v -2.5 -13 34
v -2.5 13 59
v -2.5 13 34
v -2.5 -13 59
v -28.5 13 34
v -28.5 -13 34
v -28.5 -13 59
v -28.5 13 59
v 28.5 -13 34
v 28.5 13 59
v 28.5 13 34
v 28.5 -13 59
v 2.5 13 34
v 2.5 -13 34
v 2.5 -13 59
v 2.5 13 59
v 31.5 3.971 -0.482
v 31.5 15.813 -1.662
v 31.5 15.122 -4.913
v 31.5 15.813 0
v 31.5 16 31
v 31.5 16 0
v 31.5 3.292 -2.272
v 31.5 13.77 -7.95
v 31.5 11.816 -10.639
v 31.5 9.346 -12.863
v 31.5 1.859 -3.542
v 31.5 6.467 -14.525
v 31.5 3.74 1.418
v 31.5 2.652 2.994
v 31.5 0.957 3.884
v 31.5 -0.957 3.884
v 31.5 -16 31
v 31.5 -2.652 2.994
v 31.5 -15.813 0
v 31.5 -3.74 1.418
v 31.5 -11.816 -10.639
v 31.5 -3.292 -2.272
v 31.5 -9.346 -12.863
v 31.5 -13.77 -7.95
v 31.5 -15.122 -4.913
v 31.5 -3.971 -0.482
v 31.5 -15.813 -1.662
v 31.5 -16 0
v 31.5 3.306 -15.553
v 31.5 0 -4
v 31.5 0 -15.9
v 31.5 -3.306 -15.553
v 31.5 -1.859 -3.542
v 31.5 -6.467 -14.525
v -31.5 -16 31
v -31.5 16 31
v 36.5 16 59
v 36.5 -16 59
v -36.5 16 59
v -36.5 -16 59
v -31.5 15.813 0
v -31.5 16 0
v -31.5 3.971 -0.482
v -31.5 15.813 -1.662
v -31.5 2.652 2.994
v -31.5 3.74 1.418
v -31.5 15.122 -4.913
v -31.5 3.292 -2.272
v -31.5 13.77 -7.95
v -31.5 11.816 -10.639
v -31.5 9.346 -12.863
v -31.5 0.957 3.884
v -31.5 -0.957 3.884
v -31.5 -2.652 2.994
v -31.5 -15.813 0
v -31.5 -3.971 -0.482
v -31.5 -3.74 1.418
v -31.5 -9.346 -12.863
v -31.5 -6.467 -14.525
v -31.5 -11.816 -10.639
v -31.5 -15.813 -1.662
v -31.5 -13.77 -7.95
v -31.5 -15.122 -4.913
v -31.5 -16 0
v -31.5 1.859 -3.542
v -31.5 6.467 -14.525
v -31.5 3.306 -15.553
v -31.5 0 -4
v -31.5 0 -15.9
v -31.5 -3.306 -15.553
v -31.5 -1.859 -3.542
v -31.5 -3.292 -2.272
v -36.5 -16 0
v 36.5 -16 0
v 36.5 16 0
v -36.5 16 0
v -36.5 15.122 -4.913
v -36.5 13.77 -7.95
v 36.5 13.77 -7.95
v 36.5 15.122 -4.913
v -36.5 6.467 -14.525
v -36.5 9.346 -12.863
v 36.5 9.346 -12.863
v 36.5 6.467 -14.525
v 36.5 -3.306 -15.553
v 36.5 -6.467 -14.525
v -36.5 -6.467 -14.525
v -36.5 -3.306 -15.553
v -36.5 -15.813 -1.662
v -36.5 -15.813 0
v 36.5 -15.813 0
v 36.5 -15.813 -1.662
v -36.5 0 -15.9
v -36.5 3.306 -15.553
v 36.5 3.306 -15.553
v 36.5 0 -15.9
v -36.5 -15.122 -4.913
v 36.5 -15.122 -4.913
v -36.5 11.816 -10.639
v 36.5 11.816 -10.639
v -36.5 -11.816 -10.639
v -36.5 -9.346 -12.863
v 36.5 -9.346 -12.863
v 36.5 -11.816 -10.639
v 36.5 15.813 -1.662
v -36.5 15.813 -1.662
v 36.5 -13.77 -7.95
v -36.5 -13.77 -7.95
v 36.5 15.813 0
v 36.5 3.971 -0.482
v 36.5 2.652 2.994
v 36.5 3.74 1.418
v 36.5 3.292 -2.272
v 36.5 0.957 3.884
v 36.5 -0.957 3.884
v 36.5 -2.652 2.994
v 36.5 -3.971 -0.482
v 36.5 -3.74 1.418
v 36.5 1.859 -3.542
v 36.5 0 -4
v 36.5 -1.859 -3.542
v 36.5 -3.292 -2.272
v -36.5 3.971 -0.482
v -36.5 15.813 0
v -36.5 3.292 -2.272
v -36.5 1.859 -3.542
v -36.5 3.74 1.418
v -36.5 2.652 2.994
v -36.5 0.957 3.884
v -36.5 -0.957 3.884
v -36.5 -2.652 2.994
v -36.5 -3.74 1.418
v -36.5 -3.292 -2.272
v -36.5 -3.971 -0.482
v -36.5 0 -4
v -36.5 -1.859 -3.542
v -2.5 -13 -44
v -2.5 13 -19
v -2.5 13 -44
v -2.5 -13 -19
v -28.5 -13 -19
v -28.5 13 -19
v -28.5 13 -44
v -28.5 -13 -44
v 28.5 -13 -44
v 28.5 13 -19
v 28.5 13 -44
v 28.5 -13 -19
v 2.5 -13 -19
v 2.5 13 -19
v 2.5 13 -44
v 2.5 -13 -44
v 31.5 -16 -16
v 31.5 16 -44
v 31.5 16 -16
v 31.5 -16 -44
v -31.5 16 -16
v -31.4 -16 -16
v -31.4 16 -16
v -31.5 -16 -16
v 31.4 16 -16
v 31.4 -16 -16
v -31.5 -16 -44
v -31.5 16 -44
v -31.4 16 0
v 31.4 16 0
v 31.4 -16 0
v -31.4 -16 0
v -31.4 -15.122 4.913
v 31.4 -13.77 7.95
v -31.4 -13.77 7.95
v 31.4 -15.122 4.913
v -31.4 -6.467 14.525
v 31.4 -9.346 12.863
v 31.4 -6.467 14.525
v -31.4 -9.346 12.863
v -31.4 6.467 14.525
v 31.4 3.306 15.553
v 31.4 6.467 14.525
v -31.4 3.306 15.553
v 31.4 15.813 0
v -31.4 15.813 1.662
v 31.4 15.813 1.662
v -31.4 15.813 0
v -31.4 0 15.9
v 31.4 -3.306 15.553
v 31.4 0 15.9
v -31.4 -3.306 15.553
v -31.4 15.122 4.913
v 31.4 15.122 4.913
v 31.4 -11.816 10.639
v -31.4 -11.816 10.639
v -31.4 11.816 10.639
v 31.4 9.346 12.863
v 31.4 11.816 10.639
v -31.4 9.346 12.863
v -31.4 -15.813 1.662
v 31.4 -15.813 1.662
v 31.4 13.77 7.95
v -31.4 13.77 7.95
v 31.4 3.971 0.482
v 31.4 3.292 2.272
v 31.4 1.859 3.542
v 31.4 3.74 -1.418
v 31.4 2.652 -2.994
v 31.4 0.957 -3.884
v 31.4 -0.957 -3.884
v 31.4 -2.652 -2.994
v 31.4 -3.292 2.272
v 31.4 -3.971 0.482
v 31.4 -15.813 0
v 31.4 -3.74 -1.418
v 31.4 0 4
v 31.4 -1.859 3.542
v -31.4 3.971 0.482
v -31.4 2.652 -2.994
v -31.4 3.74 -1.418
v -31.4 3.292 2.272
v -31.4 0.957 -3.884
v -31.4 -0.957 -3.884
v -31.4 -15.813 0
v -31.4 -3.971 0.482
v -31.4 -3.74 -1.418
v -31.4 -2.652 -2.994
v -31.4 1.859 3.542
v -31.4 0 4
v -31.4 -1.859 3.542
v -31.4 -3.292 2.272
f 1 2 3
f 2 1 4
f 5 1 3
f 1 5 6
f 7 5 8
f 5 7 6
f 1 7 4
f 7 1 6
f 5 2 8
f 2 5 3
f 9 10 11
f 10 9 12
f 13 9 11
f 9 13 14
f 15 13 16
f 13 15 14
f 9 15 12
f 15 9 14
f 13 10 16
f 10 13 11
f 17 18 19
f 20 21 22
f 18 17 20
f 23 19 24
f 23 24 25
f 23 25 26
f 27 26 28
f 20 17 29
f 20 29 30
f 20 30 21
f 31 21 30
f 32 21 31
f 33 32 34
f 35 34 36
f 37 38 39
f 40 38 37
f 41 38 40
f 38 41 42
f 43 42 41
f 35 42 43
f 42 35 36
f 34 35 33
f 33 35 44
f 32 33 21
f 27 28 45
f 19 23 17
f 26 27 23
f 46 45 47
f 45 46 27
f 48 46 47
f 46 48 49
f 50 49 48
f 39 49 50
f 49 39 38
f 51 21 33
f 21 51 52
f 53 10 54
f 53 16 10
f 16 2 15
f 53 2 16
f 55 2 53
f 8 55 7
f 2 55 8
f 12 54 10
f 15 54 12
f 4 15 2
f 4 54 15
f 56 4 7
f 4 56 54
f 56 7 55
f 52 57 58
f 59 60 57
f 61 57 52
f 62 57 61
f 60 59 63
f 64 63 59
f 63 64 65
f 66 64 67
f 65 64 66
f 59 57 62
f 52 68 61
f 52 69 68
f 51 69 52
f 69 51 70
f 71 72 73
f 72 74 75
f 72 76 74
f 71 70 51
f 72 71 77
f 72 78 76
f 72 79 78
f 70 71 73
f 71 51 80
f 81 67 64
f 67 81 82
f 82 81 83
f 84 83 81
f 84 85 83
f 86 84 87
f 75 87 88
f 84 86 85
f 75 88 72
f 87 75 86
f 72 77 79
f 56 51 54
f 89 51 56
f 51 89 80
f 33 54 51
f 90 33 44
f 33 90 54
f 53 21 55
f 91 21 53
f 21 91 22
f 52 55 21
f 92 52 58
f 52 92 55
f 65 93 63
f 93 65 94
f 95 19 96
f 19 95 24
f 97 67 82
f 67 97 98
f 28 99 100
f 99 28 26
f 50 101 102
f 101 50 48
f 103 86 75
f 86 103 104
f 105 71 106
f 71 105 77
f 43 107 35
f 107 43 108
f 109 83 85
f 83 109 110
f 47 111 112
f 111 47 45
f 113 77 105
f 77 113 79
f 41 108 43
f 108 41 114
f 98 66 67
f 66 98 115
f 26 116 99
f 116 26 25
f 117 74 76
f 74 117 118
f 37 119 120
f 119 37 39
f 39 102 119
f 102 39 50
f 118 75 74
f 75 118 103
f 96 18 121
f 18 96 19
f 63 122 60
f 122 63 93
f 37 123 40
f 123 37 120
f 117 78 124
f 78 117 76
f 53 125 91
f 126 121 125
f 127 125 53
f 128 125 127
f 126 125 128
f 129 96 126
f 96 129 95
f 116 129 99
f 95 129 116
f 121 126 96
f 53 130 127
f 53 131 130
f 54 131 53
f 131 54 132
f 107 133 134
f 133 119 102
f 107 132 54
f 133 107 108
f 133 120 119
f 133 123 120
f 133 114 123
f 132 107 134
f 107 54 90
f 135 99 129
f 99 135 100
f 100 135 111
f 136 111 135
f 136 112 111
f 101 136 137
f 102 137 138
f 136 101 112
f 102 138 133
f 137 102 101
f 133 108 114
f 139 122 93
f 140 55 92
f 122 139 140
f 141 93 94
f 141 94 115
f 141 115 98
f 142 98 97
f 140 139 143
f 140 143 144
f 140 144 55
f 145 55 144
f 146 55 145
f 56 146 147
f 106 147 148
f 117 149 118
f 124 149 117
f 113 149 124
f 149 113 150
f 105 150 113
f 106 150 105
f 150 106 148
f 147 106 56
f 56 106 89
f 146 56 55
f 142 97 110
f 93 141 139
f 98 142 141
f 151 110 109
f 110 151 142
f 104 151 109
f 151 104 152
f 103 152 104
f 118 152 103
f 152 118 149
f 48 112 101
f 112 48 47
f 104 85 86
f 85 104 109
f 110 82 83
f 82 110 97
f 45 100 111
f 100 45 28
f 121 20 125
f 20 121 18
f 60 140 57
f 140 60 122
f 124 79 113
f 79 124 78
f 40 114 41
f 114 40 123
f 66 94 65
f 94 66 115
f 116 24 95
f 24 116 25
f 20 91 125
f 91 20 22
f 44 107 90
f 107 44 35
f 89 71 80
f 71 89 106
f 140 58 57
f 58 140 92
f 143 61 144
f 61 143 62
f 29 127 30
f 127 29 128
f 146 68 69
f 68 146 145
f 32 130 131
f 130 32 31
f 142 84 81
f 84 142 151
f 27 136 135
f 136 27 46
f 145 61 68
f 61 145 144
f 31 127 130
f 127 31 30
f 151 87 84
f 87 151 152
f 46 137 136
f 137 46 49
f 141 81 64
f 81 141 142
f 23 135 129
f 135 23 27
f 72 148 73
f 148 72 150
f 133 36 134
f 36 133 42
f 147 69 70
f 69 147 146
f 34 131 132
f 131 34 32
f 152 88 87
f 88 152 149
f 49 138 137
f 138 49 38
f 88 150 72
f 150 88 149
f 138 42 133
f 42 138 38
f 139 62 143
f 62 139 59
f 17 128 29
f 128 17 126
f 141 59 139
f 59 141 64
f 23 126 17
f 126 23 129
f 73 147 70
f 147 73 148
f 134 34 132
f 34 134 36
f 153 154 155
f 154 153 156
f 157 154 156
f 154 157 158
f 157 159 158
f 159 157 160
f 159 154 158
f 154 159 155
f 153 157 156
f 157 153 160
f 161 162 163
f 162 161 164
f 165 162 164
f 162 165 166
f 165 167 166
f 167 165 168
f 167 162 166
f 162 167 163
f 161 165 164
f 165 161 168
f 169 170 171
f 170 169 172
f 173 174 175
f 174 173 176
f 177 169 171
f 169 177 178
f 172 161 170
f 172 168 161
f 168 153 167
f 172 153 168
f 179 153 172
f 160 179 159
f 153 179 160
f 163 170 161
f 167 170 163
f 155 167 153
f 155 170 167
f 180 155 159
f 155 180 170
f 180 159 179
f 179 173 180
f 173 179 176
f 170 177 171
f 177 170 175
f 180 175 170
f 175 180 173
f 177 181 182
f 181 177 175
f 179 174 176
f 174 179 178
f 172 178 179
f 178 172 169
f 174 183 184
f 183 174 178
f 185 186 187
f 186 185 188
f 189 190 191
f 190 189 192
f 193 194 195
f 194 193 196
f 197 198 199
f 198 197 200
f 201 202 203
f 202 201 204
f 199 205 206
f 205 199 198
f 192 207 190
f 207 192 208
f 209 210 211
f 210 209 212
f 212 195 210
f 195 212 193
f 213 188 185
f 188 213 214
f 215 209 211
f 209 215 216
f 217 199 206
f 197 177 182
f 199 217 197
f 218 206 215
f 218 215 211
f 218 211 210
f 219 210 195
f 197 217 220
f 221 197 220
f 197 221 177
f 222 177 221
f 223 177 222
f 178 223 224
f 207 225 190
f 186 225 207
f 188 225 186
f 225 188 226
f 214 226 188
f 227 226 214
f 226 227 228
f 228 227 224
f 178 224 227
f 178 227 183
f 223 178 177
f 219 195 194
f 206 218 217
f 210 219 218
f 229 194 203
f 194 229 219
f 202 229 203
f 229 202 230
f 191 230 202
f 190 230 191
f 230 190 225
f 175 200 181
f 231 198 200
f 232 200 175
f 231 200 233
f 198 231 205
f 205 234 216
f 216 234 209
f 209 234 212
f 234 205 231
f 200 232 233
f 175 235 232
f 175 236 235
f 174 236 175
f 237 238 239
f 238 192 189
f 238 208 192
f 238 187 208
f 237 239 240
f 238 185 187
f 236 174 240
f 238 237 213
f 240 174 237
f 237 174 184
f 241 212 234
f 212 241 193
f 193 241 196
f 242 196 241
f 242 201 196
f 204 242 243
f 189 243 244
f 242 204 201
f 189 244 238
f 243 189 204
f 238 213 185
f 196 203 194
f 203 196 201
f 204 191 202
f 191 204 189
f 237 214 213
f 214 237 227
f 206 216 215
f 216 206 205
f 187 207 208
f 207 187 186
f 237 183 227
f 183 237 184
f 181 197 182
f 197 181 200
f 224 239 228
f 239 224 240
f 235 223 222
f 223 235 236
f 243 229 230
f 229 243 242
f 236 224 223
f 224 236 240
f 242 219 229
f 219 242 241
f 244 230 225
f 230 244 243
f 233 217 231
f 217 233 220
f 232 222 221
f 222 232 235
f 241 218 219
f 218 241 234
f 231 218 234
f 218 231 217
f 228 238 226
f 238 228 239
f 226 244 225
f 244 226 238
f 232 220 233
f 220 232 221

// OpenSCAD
//diameter of pin
pindia = 8;
//extrusion side
extrusionside = 26;
//distance between the two extrusions
extrusionsep = 5;
//Thickness of material around the extrusion
extrusionsurrond = 3;
//legnth of material going over the extrusion (covering the extrusion)
extrusioncover = 25;
// the width of the inside of the hinge
hingewidth = extrusionside*2 + extrusionsep+extrusionsurrond*2;
//the thickness of the end hinges
hingethickness = 5;
//thickness of material around pin
pinsurrond = (extrusionside+extrusionsurrond*2-pindia)/2;
//the offset of the hinge from the start of hinge joint
hingeoffset = 15;
// tolerance for the hinge radially
pinsurrondtol = .1;
//tolerance for the hinge axially
hingetol = .2;

module cap() {
    difference(){
        union(){
            translate([-(extrusionsep + extrusionside*2+extrusionsurrond*2)/2, -(extrusionside+extrusionsurrond*2)/2,0]){cube([extrusionsep + extrusionside*2+extrusionsurrond*2, extrusionside+extrusionsurrond*2,extrusioncover+extrusionsurrond]);}
        }
        
        union(){
            translate([-extrusionsep/2-extrusionside,-extrusionside/2,-1]){cube([extrusionside,extrusionside,extrusioncover + 1]);}
            translate([extrusionsep/2,-extrusionside/2,-1]){cube([extrusionside,extrusionside,extrusioncover + 1]);}
        }
    }
}

//cap();

module hingein(){
    difference(){
        union(){
            translate([-(hingewidth - hingetol)/2,0,0]){rotate(a = [0,90,0]){cylinder(r = (pindia+pinsurrond*2-pinsurrondtol*2)/2, h = hingewidth - hingetol);}}
            translate([-(hingewidth - hingetol)/2,-(pindia+pinsurrond*2)/2,0]){cube([hingewidth - hingetol,(pindia+pinsurrond*2),(pindia+pinsurrond*2)/2]);}
        }
        
        union(){
            translate([-(hingewidth - hingetol/2 + 1)/2,0,0]){rotate(a = [0,90,0]){cylinder(r = (pindia)/2, h = hingewidth - hingetol/2 + 1);}}
        }
    }
}

//hingein();

module hingeout(){
     difference(){
        union(){
            translate([-(extrusionsep + extrusionside*2+extrusionsurrond*2+hingethickness*2)/2,0,0]){rotate(a = [0,90,0]){cylinder(r = (pindia+pinsurrond*2-pinsurrondtol*2)/2, h = extrusionsep + extrusionside*2+extrusionsurrond*2 + hingethickness*2);}}
            translate([-(extrusionsep + extrusionside*2+extrusionsurrond*2+hingethickness*2)/2,-(pindia+pinsurrond*2)/2,0]){cube([extrusionsep + extrusionside*2+extrusionsurrond*2+hingethickness*2,(pindia+pinsurrond*2),(pindia+pinsurrond*2)/2 + hingeoffset+extrusioncover+extrusionsurrond]);}
        }
        
        union(){
            translate([-(extrusionsep + extrusionside*2+extrusionsurrond*2 +hingethickness * 2 + 1)/2,0,0]){rotate(a = [0,90,0]){cylinder(r = (pindia)/2, h = extrusionsep + extrusionside*2+extrusionsurrond*2 +hingethickness * 2 + 1);}}
            
            translate([-(hingewidth)/2,-(pindia+pinsurrond*2 + 1)/2,-(pindia+pinsurrond*2 + 1)/2]){cube([hingewidth,(pindia+pinsurrond*2 + 1),(pindia+pinsurrond*2 + hingeoffset+ extrusioncover+extrusionsurrond +1)]);}
        }
    }
}

module connection(){
    difference(){
        union(){
            translate([-(pinsurrond*2 + pinsurrondtol+ pindia)/2,0,0]){cylinder(r = (pindia + pinsurrond*2)/2, h = (extrusionsep + extrusionside*2+extrusionsurrond*2 - hingewidth )/ 2);}
            translate([(pinsurrond*2 + pinsurrondtol+ pindia)/2,0,0]){cylinder(r = (pindia + pinsurrond*2)/2, h = (extrusionsep + extrusionside*2+extrusionsurrond*2 - hingewidth )/ 2);}
            translate([-(pinsurrond*2 + pinsurrondtol+ pindia)/2,-(pindia + pinsurrond*2)/2,0]){cube([pinsurrond*2 + pinsurrondtol+ pindia,pindia + pinsurrond*2,(extrusionsep + extrusionside*2+extrusionsurrond*2 - hingewidth )/ 2]);}
        }
        
        union(){
            translate([-(pinsurrond*2 + pinsurrondtol+ pindia)/2,0,-.1]){cylinder(r = (pindia)/2, h = (extrusionsep + extrusionside*2+extrusionsurrond*2 - hingewidth )/ 2 + .2);}
            translate([(pinsurrond*2 + pinsurrondtol+ pindia)/2,0,-.1]){cylinder(r = (pindia)/2, h = (extrusionsep + extrusionside*2+extrusionsurrond*2 - hingewidth )/ 2 + .2);}
        }
    }
}

//rotate(a = [0,270,180]){translate([pinsurrond+pindia/2,0,0]){connection();}}

//hingeout();

//lower
union(){
    translate([0,0,(pindia+pinsurrond*2)/2+extrusioncover+extrusionsurrond + hingeoffset]){rotate(a = [180,0,0]){cap();}}
    hingeout();
}

//upper
rotate(a = [180,0,0]){union(){
        translate([0,0,(pindia+pinsurrond*2)/2+extrusioncover+extrusionsurrond]){rotate(a = [180,0,0]){cap();}}
    hingein();
}}
